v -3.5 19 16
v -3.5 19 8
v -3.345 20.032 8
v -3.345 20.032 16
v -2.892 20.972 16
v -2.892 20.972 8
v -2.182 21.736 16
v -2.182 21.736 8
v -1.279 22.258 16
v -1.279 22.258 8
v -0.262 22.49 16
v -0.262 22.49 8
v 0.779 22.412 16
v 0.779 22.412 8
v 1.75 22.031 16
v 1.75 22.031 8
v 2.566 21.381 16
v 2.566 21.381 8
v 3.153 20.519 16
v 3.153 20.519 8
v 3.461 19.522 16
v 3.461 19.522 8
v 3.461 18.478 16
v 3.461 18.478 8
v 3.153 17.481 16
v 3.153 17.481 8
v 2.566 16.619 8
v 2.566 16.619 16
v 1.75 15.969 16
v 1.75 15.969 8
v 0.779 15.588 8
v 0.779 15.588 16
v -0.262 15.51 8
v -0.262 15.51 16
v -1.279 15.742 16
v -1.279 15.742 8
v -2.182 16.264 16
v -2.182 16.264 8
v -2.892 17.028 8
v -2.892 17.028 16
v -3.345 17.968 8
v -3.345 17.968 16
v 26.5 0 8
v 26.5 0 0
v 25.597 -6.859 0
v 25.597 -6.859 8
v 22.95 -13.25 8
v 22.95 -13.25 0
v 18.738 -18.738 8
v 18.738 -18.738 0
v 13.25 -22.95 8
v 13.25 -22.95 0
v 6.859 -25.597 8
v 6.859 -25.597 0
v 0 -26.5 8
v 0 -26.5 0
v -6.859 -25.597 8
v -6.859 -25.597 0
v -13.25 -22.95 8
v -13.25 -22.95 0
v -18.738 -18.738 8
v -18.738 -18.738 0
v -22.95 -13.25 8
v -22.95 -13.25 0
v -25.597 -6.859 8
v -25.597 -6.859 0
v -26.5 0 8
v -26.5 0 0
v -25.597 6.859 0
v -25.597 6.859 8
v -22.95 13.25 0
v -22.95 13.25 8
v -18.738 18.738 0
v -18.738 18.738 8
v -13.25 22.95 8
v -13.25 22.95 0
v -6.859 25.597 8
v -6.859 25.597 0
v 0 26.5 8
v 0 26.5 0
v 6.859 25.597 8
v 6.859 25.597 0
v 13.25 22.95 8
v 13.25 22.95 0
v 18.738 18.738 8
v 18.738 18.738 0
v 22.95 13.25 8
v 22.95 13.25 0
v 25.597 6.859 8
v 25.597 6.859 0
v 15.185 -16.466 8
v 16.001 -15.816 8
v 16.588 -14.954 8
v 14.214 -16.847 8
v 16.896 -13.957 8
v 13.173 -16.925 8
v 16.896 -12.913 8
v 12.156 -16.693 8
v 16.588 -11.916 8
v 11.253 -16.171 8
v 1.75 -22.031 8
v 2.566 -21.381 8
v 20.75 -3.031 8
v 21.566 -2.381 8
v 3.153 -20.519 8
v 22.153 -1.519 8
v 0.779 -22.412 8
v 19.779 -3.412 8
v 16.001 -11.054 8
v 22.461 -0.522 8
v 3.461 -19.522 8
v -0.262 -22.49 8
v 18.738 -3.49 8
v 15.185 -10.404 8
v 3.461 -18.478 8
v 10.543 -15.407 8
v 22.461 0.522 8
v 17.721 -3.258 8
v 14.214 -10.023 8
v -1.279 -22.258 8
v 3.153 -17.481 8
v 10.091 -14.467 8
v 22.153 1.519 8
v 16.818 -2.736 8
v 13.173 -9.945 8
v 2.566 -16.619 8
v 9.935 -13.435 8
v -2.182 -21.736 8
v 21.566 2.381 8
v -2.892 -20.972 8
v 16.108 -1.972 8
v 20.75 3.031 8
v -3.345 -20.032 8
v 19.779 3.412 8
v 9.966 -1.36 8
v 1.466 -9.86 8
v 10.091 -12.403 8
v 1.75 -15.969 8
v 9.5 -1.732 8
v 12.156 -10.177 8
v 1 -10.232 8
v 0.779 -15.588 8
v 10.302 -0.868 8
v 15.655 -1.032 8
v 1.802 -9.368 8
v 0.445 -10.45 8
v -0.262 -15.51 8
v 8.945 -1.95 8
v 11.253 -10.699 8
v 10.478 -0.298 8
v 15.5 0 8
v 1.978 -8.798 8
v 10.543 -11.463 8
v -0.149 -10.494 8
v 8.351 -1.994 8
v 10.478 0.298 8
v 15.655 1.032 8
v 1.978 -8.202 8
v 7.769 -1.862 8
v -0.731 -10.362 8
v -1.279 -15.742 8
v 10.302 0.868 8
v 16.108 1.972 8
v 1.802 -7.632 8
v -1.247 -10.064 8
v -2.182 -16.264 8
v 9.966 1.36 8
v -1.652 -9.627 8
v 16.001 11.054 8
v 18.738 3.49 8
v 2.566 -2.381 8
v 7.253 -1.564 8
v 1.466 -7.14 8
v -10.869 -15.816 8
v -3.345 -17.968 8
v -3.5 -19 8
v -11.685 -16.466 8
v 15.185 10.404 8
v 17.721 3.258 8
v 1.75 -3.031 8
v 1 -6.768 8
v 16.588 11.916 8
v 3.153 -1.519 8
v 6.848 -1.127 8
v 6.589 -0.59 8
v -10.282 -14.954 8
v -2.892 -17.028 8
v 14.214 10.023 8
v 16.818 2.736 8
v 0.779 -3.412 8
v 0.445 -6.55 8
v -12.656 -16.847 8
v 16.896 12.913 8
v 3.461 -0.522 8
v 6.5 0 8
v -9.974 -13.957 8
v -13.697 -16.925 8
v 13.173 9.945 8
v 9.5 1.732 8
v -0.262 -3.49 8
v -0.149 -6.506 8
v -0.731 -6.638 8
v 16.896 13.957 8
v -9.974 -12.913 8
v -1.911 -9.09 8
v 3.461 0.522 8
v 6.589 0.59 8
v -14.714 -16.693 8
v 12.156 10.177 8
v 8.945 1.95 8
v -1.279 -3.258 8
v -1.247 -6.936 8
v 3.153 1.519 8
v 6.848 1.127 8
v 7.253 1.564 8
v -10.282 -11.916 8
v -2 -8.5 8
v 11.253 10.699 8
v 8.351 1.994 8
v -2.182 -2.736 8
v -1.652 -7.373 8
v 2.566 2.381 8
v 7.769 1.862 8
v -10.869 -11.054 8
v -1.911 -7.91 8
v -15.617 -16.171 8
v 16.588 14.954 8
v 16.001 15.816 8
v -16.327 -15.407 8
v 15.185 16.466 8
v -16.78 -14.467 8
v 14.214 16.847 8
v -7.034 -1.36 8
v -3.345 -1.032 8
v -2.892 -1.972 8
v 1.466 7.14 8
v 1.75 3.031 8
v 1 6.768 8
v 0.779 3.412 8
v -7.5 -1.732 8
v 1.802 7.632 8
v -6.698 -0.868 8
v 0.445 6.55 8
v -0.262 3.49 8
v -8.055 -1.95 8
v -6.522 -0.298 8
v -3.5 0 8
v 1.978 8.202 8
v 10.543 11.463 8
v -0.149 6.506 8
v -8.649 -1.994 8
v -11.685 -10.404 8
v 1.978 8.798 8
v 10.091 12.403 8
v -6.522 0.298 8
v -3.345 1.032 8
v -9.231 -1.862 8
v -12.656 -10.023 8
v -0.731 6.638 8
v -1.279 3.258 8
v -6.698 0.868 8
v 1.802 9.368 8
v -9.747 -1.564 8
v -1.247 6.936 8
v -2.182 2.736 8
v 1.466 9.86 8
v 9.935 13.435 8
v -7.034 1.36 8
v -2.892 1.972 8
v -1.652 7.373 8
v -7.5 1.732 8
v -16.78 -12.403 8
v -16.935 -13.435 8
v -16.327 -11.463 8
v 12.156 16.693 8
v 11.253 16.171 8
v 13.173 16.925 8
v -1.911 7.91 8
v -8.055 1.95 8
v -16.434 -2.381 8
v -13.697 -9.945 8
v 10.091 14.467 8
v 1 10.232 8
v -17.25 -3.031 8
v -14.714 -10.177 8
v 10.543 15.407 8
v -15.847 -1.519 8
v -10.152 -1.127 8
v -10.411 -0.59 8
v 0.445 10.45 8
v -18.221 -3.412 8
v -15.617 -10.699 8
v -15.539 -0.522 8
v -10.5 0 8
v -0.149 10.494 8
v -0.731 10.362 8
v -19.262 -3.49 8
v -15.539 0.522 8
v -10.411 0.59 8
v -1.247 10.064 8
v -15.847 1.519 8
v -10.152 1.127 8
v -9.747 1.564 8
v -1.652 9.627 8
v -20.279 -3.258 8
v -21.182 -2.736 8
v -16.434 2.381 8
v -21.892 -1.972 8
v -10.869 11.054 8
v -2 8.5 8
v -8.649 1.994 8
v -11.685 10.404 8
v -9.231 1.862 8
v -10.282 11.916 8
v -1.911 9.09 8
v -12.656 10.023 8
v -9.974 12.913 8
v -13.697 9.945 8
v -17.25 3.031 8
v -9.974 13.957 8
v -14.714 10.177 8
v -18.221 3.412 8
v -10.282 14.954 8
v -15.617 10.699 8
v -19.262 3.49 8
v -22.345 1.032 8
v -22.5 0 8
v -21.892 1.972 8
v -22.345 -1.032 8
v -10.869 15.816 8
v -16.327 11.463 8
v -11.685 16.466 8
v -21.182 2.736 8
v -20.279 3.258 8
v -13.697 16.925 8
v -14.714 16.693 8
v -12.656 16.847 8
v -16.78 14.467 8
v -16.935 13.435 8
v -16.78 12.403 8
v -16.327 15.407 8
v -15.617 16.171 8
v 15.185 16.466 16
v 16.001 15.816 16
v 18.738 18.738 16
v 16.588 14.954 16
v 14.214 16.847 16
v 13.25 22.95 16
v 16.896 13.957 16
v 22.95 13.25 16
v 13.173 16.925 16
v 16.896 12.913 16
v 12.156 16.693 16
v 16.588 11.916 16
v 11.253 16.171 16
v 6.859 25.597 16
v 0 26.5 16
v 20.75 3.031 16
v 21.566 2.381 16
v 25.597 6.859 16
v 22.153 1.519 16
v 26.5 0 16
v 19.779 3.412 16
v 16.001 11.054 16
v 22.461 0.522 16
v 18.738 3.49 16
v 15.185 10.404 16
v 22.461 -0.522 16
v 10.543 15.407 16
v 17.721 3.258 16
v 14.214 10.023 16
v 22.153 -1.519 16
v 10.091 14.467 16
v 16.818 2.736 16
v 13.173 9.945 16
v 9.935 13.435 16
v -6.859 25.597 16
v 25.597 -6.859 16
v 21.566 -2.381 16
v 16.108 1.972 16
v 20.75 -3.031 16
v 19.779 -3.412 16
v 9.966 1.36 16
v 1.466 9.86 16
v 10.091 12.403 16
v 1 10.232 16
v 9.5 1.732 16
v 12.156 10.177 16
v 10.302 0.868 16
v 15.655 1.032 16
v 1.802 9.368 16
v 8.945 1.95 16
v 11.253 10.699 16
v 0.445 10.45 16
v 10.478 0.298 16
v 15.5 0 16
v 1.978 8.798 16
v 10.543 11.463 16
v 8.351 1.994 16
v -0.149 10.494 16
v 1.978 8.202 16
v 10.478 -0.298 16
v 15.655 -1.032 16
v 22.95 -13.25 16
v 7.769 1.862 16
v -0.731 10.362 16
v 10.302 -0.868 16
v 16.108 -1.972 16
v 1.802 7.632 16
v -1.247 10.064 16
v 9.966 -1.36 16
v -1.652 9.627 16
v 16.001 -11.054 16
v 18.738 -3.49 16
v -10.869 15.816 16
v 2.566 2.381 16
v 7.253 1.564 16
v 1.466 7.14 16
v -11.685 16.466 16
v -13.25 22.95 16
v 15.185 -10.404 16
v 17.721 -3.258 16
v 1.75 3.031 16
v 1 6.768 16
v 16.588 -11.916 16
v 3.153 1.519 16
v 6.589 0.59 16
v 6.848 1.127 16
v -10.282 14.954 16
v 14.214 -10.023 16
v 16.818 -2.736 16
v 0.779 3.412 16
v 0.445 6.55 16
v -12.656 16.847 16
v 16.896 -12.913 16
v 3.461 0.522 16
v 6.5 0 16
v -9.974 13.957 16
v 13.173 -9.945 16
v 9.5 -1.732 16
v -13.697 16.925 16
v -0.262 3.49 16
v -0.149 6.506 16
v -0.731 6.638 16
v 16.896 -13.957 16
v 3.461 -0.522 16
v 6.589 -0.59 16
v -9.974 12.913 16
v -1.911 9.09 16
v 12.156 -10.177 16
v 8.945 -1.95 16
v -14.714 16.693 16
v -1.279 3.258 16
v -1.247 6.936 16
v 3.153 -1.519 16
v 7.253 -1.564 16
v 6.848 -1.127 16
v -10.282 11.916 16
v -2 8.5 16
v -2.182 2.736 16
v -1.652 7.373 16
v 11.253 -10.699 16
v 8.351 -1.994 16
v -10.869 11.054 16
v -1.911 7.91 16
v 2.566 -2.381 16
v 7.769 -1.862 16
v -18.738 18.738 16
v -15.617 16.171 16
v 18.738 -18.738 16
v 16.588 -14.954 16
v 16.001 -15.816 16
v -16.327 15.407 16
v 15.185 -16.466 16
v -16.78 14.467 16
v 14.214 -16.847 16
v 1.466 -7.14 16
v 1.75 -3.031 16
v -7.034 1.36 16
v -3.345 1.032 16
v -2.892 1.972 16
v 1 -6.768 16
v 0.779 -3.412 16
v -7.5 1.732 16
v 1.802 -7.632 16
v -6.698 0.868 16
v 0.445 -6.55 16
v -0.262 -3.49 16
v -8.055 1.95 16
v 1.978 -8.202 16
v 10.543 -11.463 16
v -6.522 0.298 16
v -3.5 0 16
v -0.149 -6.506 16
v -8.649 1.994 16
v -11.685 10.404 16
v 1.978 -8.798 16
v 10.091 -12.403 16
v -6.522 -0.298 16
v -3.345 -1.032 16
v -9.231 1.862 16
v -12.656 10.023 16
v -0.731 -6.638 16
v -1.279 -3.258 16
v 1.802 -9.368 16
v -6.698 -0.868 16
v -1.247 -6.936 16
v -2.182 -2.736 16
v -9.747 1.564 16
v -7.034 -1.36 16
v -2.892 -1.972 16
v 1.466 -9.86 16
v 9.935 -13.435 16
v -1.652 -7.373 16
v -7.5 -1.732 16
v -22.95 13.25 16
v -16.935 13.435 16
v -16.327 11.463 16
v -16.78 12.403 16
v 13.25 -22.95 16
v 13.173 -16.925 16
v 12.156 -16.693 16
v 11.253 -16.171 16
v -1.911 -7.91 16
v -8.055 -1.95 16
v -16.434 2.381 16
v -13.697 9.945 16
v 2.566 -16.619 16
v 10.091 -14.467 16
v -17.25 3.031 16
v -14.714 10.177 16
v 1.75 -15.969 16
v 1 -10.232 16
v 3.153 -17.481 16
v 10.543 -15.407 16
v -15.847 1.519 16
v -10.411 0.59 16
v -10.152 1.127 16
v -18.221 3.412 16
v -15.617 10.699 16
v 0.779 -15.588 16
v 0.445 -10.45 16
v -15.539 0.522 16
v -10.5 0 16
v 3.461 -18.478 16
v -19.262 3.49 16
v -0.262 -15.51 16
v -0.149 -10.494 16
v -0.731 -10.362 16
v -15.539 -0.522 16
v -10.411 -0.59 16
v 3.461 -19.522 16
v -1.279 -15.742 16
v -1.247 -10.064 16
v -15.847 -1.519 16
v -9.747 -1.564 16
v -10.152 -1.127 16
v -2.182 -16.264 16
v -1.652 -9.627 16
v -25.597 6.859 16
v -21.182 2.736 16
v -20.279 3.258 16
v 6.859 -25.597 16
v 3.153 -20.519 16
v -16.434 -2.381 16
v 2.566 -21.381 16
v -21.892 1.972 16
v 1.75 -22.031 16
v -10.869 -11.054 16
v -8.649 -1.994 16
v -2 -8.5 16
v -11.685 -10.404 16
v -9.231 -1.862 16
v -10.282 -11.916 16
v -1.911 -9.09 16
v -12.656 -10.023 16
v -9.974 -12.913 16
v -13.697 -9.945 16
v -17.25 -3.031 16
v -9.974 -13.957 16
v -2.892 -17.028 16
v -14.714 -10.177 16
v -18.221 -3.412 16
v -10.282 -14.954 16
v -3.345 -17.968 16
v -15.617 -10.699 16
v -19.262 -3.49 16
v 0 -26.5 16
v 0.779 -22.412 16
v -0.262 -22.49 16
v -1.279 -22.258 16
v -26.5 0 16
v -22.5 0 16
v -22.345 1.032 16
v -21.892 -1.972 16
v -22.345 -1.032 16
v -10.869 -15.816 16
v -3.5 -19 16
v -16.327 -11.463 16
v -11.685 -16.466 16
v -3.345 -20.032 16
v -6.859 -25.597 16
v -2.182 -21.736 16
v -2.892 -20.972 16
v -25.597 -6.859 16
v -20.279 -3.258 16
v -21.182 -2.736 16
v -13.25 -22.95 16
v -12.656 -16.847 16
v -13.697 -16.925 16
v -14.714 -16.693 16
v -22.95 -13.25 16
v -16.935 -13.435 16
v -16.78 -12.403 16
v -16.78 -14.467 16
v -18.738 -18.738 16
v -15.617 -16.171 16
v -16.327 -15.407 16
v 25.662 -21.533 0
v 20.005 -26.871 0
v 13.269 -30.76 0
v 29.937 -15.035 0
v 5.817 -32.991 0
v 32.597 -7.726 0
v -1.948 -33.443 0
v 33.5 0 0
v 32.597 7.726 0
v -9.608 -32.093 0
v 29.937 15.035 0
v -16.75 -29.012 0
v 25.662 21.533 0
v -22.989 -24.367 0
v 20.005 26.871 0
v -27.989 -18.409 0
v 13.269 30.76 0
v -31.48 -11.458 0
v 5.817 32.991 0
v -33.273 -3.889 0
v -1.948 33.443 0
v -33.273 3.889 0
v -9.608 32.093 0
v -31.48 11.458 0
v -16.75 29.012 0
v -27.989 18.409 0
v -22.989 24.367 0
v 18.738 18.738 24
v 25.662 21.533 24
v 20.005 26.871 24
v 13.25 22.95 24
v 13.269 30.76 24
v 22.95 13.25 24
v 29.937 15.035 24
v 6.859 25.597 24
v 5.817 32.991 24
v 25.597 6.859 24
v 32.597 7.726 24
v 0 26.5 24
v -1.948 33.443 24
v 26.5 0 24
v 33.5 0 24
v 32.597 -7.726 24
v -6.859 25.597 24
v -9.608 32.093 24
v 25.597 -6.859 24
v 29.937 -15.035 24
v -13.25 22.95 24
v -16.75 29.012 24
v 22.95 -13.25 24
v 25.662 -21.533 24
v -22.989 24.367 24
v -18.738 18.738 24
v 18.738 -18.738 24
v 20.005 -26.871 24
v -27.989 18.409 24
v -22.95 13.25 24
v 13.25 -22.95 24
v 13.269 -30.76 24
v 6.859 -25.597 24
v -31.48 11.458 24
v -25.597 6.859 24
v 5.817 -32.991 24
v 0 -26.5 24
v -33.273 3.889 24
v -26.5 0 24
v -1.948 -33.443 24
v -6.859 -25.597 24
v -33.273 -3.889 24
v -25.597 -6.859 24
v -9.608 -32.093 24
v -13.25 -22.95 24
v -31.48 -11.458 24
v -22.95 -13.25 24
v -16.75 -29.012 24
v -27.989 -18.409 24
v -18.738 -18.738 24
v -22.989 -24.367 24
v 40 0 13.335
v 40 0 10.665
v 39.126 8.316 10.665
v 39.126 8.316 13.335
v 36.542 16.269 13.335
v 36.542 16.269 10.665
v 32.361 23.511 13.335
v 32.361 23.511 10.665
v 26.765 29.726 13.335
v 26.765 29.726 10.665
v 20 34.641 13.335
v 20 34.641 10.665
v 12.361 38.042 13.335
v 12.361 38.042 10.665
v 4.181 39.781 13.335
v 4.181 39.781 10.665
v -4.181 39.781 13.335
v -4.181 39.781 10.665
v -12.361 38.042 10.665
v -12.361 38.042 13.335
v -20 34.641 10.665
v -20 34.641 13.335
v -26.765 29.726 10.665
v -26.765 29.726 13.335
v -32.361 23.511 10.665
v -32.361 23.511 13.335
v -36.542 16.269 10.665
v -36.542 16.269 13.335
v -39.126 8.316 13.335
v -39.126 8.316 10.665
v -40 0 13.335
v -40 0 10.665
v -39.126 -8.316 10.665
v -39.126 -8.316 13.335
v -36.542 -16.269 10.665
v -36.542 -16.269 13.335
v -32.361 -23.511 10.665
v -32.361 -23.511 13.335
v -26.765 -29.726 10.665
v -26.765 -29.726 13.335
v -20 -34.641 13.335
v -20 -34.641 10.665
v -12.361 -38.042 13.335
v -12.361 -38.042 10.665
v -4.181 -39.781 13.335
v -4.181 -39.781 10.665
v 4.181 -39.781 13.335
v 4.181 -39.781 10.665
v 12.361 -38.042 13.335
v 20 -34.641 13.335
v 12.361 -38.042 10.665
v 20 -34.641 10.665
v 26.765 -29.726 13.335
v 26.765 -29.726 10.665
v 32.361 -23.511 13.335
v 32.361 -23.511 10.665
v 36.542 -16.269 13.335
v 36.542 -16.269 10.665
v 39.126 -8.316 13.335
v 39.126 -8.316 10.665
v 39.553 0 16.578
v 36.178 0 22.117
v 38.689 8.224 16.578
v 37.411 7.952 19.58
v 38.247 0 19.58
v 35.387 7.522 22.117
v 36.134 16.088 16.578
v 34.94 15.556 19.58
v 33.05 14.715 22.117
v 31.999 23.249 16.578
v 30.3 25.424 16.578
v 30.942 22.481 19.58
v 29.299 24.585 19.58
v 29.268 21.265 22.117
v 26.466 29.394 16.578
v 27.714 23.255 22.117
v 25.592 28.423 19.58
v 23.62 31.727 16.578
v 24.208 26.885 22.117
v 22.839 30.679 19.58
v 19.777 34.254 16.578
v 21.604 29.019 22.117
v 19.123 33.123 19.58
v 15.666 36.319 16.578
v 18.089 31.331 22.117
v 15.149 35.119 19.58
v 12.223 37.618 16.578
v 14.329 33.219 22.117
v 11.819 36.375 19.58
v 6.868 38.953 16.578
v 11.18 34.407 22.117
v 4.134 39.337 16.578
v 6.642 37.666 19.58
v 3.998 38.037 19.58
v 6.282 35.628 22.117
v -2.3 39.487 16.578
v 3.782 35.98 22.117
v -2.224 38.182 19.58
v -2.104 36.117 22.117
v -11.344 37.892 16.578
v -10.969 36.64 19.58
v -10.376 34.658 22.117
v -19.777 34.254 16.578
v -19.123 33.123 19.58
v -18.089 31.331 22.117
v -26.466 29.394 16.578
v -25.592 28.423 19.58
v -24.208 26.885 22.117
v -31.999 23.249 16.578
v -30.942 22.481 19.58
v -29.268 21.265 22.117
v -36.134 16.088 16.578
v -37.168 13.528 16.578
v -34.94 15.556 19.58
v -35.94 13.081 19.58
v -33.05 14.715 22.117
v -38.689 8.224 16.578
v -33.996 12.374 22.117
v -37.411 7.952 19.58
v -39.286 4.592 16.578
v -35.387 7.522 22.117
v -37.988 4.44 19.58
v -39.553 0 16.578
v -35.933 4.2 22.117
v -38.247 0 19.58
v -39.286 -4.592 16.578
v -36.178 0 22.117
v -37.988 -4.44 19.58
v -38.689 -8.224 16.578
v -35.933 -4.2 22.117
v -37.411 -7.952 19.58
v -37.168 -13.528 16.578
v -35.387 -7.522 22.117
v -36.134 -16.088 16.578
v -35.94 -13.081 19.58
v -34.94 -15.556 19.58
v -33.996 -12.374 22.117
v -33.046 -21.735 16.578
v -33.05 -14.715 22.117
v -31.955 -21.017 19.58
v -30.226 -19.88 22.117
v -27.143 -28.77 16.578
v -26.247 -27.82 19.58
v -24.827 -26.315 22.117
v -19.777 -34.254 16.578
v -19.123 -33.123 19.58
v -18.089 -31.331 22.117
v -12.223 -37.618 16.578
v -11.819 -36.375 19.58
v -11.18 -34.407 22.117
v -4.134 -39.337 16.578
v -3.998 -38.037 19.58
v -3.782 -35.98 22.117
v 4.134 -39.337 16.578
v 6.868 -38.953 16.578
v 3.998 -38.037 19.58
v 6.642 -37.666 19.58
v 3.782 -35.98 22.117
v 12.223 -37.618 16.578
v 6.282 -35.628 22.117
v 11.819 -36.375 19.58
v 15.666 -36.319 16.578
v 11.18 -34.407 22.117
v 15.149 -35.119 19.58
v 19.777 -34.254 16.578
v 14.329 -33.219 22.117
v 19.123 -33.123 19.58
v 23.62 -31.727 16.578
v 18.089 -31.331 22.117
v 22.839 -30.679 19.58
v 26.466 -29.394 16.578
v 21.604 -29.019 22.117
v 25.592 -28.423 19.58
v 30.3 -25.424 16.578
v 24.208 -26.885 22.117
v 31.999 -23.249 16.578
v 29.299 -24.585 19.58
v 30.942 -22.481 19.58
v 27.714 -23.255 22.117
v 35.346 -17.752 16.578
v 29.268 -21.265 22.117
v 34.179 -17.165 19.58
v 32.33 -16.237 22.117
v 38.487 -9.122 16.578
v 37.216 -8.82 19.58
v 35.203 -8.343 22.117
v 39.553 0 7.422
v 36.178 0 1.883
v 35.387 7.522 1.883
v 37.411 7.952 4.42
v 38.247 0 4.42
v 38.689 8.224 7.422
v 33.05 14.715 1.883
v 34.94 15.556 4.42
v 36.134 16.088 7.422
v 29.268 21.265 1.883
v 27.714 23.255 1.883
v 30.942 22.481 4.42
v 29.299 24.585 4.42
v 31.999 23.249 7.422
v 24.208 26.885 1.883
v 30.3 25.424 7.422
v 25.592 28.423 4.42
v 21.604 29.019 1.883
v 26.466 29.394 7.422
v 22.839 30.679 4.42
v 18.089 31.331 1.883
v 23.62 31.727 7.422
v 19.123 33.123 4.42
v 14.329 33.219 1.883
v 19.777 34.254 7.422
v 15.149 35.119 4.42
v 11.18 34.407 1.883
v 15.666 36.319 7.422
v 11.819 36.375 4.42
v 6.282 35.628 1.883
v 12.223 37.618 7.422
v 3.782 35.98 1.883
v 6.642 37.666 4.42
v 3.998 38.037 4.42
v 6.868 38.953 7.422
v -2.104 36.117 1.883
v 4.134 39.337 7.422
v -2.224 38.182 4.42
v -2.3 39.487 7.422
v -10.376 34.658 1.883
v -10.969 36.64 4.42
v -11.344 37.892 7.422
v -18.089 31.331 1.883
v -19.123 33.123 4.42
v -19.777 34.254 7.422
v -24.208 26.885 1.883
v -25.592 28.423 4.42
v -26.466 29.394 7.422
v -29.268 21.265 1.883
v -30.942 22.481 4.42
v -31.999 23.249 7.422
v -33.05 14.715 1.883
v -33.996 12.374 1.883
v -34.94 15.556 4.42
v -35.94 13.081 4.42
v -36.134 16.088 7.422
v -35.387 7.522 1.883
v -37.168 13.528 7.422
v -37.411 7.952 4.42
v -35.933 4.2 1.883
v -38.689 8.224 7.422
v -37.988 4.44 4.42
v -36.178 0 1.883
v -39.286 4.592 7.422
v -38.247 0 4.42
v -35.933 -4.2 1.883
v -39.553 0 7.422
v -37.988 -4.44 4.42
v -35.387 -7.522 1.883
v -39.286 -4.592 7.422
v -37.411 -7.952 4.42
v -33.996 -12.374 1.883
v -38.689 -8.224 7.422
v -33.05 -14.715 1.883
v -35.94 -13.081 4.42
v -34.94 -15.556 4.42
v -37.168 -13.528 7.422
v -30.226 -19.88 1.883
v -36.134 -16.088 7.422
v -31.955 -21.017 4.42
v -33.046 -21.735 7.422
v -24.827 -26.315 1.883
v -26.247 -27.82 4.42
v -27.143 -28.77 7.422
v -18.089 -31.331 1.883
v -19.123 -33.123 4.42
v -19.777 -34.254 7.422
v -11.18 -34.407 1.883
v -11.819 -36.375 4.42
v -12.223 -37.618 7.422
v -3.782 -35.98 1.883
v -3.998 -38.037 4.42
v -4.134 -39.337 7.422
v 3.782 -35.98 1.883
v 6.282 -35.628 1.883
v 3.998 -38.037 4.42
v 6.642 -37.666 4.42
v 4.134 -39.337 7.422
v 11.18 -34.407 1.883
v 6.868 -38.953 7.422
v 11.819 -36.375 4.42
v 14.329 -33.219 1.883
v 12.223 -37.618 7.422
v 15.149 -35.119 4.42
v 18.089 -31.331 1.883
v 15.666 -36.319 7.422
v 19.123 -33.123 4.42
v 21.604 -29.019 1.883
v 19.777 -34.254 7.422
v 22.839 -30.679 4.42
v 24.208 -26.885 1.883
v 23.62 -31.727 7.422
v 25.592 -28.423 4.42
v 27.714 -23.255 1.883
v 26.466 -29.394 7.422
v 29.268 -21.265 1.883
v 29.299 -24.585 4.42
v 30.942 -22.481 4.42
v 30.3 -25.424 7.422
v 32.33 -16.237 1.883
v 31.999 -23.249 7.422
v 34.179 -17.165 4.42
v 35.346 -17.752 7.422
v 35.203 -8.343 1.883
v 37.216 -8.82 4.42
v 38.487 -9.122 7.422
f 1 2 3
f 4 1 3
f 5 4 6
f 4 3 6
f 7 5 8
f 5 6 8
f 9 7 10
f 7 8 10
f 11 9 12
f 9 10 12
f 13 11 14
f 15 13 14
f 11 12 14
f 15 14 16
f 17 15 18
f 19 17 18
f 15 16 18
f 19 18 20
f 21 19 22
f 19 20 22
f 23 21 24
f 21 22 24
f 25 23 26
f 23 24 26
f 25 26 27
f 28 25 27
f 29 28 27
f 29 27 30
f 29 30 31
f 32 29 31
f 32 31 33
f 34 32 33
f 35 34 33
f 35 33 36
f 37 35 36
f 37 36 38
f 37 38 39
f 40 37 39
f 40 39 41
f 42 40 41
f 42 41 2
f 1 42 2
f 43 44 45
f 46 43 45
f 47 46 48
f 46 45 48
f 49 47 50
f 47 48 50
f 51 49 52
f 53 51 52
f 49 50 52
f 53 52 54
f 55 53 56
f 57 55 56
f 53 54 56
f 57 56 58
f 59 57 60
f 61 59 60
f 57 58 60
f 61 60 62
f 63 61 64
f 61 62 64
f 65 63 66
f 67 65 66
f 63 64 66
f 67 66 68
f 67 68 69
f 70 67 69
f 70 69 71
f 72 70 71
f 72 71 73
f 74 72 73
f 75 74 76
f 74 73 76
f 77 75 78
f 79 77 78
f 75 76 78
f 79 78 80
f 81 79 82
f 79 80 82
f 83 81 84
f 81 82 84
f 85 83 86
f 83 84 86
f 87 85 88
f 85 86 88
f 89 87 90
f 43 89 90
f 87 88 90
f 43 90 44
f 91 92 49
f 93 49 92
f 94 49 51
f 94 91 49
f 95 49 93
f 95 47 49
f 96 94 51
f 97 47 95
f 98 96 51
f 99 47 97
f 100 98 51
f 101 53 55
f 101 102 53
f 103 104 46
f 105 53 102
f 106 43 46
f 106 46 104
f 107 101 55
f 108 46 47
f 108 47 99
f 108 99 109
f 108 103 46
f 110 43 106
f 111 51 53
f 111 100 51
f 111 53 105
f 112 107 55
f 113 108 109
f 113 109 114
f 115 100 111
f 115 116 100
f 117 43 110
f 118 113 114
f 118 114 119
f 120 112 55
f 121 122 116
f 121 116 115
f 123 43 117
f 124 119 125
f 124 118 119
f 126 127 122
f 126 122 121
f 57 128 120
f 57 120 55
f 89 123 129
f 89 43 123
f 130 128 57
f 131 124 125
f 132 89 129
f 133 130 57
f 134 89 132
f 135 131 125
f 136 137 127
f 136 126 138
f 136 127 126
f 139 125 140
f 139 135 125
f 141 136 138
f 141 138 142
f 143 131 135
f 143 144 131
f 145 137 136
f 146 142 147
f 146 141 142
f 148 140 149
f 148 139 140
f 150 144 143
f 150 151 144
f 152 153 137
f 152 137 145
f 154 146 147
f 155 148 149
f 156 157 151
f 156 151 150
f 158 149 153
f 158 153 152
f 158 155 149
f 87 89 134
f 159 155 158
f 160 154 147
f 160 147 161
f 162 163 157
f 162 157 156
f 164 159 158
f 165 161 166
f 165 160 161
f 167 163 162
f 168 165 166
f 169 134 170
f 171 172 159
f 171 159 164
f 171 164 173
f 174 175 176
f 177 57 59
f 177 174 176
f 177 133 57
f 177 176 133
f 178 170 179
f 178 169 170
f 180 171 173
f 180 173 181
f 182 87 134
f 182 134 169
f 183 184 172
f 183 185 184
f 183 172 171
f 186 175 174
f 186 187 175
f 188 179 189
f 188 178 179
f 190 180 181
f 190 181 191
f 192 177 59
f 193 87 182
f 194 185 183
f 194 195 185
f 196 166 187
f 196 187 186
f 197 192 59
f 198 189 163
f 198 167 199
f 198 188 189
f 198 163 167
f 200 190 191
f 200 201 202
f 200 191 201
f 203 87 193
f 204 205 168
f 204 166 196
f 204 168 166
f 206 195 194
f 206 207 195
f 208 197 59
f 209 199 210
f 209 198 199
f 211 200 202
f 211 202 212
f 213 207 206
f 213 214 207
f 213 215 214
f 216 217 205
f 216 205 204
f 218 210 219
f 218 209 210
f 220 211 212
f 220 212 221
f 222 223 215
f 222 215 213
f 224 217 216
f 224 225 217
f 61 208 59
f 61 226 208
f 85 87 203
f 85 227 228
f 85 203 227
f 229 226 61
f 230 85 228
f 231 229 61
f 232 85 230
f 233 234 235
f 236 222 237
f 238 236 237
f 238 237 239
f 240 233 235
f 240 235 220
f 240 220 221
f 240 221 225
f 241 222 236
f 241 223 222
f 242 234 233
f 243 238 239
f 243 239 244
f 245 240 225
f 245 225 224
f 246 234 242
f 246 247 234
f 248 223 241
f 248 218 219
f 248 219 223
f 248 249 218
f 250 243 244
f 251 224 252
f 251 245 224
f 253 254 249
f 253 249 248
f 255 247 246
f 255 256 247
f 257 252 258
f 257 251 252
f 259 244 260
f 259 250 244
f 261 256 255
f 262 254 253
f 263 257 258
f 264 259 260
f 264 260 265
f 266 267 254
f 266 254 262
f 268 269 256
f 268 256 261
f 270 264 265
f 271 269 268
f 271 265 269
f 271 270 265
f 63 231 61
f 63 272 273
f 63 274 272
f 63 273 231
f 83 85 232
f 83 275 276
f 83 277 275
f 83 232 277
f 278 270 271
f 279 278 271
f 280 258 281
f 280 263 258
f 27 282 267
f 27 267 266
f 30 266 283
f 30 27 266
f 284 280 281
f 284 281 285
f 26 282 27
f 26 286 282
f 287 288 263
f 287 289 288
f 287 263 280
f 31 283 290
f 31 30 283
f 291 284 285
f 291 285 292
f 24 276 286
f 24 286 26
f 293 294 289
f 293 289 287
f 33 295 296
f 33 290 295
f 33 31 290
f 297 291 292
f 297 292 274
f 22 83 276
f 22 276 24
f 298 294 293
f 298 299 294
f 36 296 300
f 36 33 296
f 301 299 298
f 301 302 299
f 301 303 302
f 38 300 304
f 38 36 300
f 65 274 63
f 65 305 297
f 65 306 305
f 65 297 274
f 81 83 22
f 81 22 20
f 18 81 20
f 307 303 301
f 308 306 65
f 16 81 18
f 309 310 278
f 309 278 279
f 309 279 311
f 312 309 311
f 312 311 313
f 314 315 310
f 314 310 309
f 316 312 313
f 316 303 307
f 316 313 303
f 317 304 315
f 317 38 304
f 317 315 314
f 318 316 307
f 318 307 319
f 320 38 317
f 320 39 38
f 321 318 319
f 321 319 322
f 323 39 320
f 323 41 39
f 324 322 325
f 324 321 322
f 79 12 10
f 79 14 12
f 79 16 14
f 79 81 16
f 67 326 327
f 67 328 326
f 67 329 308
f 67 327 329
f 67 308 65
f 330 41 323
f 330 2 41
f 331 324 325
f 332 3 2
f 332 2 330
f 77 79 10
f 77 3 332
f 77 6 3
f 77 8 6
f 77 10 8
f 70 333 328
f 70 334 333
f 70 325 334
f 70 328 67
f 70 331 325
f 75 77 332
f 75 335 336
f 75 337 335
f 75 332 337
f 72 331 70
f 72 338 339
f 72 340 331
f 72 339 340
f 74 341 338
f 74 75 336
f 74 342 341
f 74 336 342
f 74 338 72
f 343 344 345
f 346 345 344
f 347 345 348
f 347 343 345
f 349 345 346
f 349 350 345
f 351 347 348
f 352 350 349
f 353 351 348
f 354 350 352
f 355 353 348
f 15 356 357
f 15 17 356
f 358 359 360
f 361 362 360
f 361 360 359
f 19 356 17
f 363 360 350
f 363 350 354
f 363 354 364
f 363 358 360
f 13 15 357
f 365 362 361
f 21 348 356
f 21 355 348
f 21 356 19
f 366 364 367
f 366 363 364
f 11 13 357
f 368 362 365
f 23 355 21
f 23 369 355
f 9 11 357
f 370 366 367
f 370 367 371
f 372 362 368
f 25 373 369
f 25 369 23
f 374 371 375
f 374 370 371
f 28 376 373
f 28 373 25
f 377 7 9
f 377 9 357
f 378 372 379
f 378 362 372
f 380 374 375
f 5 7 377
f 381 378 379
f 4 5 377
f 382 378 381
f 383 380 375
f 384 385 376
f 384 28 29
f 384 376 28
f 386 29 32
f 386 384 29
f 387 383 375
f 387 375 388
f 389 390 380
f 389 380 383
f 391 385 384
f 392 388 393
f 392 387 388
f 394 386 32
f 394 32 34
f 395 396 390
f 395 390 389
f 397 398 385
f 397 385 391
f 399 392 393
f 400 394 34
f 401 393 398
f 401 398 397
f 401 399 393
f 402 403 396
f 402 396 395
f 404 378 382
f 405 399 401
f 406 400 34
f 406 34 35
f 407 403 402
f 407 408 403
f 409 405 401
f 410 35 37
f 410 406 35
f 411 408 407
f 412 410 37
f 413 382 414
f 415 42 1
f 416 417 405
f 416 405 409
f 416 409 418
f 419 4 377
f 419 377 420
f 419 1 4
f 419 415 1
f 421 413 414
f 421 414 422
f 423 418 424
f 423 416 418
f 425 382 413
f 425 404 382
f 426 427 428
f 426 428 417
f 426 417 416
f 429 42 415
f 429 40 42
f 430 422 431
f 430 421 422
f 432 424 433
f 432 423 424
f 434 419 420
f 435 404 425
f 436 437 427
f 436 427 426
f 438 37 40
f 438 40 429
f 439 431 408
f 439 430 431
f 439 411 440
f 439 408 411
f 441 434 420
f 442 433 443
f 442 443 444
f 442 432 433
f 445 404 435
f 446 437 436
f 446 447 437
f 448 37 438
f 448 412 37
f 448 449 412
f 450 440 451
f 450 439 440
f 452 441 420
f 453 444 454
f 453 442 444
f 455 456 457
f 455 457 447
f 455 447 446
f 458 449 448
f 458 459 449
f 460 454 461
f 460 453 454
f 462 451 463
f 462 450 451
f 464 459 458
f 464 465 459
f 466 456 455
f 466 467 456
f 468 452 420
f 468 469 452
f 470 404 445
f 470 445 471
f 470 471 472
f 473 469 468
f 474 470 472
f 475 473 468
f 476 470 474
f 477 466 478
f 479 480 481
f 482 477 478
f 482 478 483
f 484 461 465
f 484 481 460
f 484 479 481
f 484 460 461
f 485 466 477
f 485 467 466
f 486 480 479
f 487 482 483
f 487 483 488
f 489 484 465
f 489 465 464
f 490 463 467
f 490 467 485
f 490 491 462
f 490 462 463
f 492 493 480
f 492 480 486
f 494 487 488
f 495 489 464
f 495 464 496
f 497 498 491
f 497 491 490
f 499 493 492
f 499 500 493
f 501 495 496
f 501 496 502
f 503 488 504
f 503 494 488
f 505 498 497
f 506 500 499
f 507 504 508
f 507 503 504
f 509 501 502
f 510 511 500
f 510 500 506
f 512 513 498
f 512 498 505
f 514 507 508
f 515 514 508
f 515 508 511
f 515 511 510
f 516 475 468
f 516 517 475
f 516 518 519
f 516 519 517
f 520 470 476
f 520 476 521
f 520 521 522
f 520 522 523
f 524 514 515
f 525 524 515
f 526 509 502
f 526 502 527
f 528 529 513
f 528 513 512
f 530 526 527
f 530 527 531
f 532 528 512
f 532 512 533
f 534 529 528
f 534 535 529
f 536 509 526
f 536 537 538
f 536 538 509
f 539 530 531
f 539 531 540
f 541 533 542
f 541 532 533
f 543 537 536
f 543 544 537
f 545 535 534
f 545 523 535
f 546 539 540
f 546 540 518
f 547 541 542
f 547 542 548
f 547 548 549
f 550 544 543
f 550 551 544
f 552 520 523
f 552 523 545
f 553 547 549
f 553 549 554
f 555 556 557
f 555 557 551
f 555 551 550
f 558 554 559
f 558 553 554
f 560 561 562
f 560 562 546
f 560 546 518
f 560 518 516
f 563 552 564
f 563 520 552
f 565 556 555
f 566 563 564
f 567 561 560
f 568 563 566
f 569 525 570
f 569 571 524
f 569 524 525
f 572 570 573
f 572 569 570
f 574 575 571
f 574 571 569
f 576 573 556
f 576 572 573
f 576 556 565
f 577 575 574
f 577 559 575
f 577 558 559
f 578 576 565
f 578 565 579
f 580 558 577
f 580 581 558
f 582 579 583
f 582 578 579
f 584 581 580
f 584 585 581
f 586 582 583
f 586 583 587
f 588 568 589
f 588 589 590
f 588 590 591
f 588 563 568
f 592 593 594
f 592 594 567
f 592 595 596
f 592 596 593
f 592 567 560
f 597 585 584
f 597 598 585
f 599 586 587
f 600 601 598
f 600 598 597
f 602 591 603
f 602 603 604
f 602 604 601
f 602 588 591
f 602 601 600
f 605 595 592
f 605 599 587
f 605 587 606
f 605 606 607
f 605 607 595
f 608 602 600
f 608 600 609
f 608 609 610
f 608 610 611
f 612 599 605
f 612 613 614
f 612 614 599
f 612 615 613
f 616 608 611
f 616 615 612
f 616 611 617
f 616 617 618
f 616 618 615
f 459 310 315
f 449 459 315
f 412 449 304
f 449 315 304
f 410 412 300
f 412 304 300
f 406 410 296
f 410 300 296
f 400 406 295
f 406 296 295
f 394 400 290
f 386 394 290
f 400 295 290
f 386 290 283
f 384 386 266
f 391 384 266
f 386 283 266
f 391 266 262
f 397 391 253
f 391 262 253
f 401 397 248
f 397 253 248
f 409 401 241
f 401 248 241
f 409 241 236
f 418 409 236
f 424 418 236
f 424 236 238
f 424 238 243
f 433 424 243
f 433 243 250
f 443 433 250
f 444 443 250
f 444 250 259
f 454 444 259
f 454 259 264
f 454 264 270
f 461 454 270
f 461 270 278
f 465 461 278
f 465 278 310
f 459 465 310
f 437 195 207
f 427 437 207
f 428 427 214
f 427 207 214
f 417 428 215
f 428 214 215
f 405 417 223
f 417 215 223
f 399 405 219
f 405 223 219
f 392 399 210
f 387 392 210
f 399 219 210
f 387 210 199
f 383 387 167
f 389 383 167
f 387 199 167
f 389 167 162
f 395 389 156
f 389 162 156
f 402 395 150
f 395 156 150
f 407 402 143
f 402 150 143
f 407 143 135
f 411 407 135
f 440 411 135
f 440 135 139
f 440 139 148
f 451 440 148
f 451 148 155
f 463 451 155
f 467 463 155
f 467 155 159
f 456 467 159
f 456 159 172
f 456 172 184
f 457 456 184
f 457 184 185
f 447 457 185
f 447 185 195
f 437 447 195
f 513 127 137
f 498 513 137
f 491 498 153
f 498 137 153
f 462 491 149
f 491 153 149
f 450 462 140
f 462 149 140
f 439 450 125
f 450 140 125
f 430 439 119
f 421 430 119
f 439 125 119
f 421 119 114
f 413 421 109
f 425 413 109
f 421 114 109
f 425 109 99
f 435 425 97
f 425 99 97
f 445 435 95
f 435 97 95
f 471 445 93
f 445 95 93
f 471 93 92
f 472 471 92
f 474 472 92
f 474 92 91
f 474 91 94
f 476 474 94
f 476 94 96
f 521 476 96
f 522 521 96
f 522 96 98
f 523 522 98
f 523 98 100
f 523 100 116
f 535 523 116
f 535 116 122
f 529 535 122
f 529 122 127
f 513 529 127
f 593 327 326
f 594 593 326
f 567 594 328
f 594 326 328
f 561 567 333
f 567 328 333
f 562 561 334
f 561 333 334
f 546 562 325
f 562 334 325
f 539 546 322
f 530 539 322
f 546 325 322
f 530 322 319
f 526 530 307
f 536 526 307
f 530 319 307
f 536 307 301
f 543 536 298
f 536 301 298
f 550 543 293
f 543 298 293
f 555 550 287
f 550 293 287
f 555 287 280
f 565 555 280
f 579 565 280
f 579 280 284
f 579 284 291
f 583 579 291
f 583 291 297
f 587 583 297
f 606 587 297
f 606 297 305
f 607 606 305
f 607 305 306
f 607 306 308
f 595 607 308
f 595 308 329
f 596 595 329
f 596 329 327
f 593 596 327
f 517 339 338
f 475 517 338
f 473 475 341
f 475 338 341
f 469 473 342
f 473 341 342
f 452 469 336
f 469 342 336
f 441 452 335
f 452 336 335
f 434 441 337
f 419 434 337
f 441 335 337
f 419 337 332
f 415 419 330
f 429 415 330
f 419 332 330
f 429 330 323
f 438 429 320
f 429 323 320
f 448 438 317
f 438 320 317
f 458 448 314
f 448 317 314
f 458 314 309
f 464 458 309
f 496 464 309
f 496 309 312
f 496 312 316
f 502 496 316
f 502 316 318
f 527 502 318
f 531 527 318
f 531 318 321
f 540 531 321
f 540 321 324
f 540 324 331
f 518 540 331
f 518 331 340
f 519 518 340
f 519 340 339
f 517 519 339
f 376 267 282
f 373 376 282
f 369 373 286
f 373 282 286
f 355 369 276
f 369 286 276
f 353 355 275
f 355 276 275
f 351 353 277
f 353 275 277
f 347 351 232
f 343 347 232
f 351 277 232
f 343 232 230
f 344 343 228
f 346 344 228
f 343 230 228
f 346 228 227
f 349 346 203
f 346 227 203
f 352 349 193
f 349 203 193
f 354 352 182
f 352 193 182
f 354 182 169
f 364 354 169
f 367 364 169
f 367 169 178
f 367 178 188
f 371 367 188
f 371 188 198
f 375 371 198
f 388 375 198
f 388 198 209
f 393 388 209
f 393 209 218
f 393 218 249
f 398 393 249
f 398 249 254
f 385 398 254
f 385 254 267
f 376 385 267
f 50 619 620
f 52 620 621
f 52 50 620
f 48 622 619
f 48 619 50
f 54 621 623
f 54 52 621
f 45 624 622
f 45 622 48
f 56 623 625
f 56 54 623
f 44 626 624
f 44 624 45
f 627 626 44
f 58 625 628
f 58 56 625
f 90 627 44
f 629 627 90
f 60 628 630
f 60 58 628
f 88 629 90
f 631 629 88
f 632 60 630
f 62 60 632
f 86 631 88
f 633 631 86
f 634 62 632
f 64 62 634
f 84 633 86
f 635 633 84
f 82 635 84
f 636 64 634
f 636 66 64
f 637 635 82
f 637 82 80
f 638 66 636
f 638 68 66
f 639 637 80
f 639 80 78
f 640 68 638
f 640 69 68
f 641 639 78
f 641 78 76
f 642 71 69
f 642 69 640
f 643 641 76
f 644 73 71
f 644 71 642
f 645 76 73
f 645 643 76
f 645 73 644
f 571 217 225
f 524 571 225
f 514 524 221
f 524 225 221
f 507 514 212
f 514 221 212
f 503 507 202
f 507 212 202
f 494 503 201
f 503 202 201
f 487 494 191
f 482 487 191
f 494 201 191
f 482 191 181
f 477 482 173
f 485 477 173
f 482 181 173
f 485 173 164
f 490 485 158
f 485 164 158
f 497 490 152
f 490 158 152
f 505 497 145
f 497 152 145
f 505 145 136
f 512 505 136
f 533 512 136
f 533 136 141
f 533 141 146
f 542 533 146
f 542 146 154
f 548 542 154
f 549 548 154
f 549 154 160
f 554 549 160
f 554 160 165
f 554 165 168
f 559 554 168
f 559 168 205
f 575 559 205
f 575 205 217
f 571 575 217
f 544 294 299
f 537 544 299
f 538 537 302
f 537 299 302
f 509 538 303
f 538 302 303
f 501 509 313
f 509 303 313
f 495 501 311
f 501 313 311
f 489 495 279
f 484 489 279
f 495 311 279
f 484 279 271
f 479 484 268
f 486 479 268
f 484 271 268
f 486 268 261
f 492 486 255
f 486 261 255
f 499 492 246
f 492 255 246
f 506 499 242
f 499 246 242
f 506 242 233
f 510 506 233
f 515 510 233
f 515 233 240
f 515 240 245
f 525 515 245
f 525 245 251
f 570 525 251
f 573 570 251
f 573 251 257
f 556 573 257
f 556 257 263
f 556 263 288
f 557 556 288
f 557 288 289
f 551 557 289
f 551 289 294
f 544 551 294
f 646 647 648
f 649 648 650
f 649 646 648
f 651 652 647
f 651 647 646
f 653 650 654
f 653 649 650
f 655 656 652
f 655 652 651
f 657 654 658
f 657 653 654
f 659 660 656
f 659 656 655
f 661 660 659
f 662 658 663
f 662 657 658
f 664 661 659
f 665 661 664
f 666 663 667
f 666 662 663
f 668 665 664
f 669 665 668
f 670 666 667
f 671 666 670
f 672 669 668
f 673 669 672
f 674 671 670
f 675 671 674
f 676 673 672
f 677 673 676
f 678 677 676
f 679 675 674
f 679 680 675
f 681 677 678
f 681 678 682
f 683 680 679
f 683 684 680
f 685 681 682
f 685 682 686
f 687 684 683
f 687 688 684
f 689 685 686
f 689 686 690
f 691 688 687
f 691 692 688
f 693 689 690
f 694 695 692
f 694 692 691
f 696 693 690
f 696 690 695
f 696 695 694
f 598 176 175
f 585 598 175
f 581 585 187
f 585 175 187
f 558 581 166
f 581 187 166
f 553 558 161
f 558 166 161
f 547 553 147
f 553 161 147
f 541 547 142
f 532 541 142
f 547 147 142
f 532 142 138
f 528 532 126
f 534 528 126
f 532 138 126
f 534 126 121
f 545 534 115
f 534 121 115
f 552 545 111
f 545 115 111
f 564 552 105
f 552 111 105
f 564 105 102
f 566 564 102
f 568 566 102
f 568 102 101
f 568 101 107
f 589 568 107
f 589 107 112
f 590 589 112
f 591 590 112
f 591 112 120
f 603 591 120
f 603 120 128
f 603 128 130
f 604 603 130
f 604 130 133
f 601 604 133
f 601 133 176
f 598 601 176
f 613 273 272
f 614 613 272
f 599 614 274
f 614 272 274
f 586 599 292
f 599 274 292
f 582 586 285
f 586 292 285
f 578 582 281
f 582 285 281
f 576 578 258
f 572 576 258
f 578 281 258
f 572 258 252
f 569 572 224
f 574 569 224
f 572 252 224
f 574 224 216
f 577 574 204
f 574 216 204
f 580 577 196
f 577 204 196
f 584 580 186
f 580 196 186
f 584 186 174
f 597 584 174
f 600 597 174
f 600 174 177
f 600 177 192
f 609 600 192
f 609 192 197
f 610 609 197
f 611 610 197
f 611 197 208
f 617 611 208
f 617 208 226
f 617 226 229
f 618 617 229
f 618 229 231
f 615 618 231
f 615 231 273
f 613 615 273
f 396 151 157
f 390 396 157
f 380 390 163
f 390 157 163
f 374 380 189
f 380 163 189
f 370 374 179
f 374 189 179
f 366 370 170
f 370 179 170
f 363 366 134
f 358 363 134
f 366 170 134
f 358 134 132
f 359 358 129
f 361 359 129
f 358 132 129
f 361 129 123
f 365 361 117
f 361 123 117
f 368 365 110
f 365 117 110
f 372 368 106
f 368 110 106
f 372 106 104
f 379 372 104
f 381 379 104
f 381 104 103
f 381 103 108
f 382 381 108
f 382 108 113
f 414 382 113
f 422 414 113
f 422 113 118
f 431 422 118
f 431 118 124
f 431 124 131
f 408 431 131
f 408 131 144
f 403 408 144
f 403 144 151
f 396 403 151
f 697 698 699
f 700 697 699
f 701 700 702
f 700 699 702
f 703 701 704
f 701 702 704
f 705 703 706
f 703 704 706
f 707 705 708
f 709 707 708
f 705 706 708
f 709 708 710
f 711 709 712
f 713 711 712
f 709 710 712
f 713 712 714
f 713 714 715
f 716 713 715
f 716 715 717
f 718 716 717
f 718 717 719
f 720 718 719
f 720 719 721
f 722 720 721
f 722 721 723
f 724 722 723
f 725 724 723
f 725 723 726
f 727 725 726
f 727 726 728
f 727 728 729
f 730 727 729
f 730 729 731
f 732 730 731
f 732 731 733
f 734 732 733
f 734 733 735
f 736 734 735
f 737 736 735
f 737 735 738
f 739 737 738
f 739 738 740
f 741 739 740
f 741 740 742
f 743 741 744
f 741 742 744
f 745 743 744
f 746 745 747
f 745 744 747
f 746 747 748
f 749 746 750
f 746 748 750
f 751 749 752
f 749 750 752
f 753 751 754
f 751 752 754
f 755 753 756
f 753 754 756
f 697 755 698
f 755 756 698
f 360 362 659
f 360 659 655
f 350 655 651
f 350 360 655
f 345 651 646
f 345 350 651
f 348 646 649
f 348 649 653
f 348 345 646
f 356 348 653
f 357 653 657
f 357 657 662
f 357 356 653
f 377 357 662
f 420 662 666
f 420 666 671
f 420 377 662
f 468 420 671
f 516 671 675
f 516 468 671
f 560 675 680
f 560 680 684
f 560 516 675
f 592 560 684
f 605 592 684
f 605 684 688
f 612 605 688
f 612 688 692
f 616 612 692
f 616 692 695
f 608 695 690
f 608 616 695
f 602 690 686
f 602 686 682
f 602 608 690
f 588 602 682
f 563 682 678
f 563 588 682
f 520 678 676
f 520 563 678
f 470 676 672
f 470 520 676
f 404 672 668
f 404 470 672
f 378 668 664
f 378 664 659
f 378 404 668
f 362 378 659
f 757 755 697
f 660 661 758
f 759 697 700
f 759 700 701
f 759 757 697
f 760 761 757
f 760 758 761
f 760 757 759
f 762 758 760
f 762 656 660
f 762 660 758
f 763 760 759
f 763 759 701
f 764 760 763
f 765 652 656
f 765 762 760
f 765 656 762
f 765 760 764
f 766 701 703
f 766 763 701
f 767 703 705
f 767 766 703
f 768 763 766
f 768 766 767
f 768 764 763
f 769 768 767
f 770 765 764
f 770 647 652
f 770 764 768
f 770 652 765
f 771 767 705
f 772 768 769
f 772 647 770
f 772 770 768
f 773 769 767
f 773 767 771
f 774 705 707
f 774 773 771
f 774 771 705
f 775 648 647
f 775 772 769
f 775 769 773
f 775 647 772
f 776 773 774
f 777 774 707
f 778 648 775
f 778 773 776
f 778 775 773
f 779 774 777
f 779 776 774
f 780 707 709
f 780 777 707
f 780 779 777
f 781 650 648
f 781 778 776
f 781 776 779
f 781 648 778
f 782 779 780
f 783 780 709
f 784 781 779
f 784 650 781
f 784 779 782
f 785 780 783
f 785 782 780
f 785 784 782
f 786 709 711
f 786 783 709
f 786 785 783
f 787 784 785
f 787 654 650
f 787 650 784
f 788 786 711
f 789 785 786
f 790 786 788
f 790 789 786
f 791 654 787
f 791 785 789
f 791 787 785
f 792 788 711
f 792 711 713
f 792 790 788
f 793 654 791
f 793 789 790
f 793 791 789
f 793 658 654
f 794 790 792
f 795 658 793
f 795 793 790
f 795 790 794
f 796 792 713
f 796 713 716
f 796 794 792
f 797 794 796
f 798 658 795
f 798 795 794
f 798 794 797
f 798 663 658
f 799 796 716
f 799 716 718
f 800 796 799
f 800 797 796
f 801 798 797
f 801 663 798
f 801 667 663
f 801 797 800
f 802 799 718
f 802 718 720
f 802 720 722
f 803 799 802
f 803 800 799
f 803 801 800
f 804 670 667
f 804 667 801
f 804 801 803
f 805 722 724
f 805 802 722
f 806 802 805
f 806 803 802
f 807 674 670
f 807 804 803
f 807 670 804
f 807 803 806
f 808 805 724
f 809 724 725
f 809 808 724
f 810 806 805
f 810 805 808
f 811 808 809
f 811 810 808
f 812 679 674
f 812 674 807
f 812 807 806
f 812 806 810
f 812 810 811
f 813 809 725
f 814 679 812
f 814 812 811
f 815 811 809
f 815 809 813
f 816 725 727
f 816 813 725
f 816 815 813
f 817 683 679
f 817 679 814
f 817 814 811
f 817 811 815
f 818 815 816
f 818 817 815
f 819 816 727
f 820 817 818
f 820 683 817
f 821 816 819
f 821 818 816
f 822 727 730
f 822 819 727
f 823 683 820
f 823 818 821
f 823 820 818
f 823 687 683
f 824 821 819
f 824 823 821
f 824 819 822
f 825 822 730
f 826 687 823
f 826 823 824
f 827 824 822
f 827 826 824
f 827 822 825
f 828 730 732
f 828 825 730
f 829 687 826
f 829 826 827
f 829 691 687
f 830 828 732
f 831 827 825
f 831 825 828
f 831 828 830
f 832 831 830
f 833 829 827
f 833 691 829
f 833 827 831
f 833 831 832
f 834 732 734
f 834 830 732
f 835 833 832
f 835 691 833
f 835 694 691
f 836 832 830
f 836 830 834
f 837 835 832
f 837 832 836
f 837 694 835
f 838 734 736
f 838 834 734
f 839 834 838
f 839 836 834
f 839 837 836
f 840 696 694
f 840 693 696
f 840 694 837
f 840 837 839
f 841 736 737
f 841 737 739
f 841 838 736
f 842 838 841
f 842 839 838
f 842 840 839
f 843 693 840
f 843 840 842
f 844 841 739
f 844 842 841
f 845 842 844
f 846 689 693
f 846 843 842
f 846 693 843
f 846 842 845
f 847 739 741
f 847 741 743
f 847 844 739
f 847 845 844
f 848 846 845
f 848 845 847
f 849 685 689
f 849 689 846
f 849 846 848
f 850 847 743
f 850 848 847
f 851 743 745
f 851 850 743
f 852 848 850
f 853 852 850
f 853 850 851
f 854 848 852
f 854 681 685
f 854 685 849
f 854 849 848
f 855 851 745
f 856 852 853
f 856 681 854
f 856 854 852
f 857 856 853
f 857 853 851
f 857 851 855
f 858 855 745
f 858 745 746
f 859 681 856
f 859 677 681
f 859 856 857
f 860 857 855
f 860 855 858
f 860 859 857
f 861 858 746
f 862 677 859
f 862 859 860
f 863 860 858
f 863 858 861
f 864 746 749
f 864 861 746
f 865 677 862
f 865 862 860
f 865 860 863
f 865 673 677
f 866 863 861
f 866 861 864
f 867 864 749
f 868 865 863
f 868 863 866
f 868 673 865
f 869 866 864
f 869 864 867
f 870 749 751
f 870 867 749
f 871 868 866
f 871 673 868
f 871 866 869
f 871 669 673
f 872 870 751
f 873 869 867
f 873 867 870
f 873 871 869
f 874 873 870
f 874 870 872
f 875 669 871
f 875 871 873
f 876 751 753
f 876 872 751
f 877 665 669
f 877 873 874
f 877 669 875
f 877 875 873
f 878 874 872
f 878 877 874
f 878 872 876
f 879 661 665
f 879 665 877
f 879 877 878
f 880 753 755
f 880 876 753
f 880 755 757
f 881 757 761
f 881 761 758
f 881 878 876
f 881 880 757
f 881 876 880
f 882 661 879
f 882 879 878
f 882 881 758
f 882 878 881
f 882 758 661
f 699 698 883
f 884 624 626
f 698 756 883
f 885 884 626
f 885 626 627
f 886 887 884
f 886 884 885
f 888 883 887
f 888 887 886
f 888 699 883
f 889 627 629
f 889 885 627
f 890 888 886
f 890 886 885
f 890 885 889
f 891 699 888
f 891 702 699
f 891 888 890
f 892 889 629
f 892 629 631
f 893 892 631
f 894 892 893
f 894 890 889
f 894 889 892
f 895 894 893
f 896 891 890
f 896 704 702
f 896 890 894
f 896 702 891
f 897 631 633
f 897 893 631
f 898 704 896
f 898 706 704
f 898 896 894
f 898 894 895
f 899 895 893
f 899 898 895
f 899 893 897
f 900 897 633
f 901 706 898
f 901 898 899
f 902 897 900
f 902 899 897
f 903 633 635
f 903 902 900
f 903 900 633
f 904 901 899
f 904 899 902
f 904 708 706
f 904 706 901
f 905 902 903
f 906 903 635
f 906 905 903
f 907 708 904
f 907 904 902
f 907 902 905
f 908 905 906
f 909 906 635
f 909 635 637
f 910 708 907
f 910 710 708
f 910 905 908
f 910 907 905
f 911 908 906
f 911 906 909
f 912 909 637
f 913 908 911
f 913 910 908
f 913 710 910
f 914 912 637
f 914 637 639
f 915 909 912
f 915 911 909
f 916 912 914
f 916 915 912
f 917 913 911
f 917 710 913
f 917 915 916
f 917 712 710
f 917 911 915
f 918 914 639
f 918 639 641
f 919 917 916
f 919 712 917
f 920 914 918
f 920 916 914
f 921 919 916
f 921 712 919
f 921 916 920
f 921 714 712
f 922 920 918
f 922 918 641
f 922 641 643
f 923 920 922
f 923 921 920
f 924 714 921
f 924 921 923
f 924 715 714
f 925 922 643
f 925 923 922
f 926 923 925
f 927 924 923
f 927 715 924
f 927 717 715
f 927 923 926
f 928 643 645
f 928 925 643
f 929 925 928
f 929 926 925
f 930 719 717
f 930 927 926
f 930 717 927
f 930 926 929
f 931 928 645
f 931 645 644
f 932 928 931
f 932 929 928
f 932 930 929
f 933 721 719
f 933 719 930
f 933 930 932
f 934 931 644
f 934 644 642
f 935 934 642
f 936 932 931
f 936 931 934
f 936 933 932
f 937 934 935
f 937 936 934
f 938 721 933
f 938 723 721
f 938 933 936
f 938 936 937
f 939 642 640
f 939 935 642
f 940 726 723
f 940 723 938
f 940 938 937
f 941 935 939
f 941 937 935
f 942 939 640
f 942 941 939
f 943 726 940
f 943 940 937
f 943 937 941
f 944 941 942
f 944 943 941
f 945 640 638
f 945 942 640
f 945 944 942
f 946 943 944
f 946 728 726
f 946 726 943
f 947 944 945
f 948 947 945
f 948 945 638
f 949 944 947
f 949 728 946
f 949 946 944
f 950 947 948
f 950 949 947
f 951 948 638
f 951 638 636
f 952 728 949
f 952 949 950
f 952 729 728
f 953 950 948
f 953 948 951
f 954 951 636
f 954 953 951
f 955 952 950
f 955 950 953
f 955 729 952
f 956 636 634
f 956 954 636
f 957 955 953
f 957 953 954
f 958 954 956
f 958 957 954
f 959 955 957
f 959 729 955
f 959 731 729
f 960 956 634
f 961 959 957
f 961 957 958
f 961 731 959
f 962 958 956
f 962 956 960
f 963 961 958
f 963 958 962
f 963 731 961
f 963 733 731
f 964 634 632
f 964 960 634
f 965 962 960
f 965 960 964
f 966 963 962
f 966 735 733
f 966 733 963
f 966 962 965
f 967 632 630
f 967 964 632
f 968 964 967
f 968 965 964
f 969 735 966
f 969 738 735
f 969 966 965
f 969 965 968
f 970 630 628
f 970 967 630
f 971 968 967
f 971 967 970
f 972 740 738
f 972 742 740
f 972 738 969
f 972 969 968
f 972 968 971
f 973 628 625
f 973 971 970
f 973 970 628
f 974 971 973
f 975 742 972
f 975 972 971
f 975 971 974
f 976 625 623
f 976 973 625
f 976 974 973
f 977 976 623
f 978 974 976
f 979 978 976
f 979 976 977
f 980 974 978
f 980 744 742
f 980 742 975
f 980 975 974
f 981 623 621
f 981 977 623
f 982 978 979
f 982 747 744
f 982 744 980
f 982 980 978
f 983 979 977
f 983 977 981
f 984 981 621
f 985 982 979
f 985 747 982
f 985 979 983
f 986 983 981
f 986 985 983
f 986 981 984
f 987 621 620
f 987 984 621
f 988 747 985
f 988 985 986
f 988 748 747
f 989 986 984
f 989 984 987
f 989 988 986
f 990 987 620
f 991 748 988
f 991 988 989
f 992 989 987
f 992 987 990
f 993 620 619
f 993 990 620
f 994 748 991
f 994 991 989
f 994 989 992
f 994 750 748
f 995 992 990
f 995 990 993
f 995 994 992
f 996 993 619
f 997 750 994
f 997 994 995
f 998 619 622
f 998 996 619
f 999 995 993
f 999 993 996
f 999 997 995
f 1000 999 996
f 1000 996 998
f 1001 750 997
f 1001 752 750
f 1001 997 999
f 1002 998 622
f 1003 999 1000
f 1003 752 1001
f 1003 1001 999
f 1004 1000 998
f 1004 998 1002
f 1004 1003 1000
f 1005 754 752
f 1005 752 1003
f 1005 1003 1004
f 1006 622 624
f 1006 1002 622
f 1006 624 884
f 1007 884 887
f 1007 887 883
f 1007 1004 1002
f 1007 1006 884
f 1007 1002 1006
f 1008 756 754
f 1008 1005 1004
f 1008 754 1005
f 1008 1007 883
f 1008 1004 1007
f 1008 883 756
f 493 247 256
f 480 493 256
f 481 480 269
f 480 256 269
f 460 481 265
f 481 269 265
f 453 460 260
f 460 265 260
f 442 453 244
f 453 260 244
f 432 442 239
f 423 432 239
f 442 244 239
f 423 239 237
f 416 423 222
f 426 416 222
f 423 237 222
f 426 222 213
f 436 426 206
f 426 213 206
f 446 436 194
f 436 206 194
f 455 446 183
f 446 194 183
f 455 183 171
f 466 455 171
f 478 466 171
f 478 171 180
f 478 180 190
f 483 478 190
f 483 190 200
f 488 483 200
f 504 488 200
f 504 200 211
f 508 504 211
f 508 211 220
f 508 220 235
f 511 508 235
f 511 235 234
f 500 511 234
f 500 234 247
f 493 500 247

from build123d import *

# Parameters (mm, degrees)
ESQUISSE1_R             = 40
BOSS_EXTRU_1_DEPTH      = 24
ESQUISSE6_R             = 33.5
ENL_V_MAT_EXTRU_5_DEPTH = 8
ENL_V_START             = -8
ESQUISSE3_R             = 33.5
ENL_V_MAT_EXTRU_6_DEPTH = 8
CONG_12_R               = 12
CONG_16_R               = 12
ESQUISSE11_R            = 33.5
ESQUISSE11_R_2          = 26.5
BOSS_EXTRU_3_DEPTH      = 8
BOSS_EXTRU_4_START      = 8
ESQUISSE13_R            = 33.5
ESQUISSE13_R_2          = 26.5
BOSS_EXTRU_4_DEPTH      = 8
ESQUISSE14_R            = 3.5
ESQUISSE14_R_2          = 2
ENL_V_MAT_EXTRU_7_DEPTH = 59.787753827


with BuildPart() as part:
    # Esquisse1 → Boss.-Extru.1 (new body)
    with BuildSketch(Plane.XY):
        Circle(ESQUISSE1_R)
    extrude(amount=BOSS_EXTRU_1_DEPTH)

    # Esquisse6 → Enlèv. mat.-Extru.5 (cut)
    with BuildSketch(Plane(origin=(0, 0, 0), x_dir=(-1, 0, 0), z_dir=(0, 0, -1))):
        Circle(ESQUISSE6_R)
    extrude(amount=-ENL_V_MAT_EXTRU_5_DEPTH, mode=Mode.SUBTRACT)

    # Esquisse3 → Enlèv. mat.-Extru.6 (cut)
    with BuildSketch(Plane.XY.offset(24).offset(ENL_V_START)):
        with Locations(Location((0, 0, 0), (0, 0, 180))):
            Circle(ESQUISSE3_R)
    extrude(amount=ENL_V_MAT_EXTRU_6_DEPTH, mode=Mode.SUBTRACT)

    # Congé12
    # the kernel refuses this fillet: 12 mm, written as the material it takes off along each edge
    with BuildSketch(Plane(origin=(0, 0, 0), x_dir=(1, 0, 0), z_dir=(0, -1, 0))) as cong_12_piece_1:
        with BuildLine():
            CenterArc((28, 10.665364504), CONG_12_R, 297.279612736, 62.720387264)
            Line((33.5, 0), (33.61, -0.21330729))
            ThreePointArc((33.61, -0.21330729), (36.75, -0.24), (40, -0.24))
            Line((40, -0.24), (40.24, 0))
            Line((40.24, 0), (40.24, 10.665364504))
            Line((40.24, 10.665364504), (40, 10.665364504))
        make_face()
    revolve(axis=Axis((0, 0, 0), (0, 0, 1)), mode=Mode.SUBTRACT)

    # Congé16
    # the kernel refuses this fillet: 12 mm, written as the material it takes off along each edge
    with BuildSketch(Plane(origin=(0, 0, 24), x_dir=(1, 0, 0), z_dir=(0, -1, 0))) as cong_16_piece_1:
        with BuildLine():
            CenterArc((28, -10.665364504), CONG_16_R, 0, 62.720387264)
            Line((33.5, 0), (33.61, 0.21330729))
            ThreePointArc((33.61, 0.21330729), (36.75, 0.24), (40, 0.24))
            Line((40, 0.24), (40.24, 0))
            Line((40.24, 0), (40.24, -10.665364504))
            Line((40.24, -10.665364504), (40, -10.665364504))
        make_face()
    revolve(axis=Axis((0, 0, 24), (0, 0, 1)), mode=Mode.SUBTRACT)

    # Esquisse11 → Boss.-Extru.3 (add)
    with BuildSketch(Plane.XY.offset(16)):
        with Locations(Location((0, 0, 0), (0, 0, 180))):
            Circle(ESQUISSE11_R)
        Circle(ESQUISSE11_R_2, mode=Mode.SUBTRACT)
    extrude(amount=BOSS_EXTRU_3_DEPTH)

    # Esquisse13 → Boss.-Extru.4 (add)
    with BuildSketch(Plane(origin=(0, 0, 8), x_dir=(-1, 0, 0), z_dir=(0, 0, -1)).offset(BOSS_EXTRU_4_START)):
        Circle(ESQUISSE13_R)
        with Locations(Location((0, 0, 0), (0, 0, 180))):
            Circle(ESQUISSE13_R_2, mode=Mode.SUBTRACT)
    extrude(amount=-BOSS_EXTRU_4_DEPTH)

    # Esquisse14 → Enlèv. mat.-Extru.7 (cut, through all)
    with BuildSketch(Plane(origin=(0, 0, 8), x_dir=(-1, 0, 0), z_dir=(0, 0, -1))):
        Circle(ESQUISSE14_R)
        with Locations((-8.5, 0)):
            Circle(ESQUISSE14_R_2)
        with Locations((-19, 0)):
            Circle(ESQUISSE14_R)
        with Locations((0, 8.5)):
            Circle(ESQUISSE14_R_2)
        with Locations((8.5, 0)):
            Circle(ESQUISSE14_R_2)
        with Locations((0, -8.5)):
            Circle(ESQUISSE14_R_2)
        with Locations((-13.435028843, 13.435028843)):
            Circle(ESQUISSE14_R)
        with Locations((0, 19)):
            Circle(ESQUISSE14_R)
        with Locations((13.435028843, 13.435028843)):
            Circle(ESQUISSE14_R)
        with Locations((19, 0)):
            Circle(ESQUISSE14_R)
        with Locations((13.435028843, -13.435028843)):
            Circle(ESQUISSE14_R)
        with Locations((0, -19)):
            Circle(ESQUISSE14_R)
        with Locations((-13.435028843, -13.435028843)):
            Circle(ESQUISSE14_R)
    extrude(amount=-ENL_V_MAT_EXTRU_7_DEPTH, mode=Mode.SUBTRACT)


solid = part.part
